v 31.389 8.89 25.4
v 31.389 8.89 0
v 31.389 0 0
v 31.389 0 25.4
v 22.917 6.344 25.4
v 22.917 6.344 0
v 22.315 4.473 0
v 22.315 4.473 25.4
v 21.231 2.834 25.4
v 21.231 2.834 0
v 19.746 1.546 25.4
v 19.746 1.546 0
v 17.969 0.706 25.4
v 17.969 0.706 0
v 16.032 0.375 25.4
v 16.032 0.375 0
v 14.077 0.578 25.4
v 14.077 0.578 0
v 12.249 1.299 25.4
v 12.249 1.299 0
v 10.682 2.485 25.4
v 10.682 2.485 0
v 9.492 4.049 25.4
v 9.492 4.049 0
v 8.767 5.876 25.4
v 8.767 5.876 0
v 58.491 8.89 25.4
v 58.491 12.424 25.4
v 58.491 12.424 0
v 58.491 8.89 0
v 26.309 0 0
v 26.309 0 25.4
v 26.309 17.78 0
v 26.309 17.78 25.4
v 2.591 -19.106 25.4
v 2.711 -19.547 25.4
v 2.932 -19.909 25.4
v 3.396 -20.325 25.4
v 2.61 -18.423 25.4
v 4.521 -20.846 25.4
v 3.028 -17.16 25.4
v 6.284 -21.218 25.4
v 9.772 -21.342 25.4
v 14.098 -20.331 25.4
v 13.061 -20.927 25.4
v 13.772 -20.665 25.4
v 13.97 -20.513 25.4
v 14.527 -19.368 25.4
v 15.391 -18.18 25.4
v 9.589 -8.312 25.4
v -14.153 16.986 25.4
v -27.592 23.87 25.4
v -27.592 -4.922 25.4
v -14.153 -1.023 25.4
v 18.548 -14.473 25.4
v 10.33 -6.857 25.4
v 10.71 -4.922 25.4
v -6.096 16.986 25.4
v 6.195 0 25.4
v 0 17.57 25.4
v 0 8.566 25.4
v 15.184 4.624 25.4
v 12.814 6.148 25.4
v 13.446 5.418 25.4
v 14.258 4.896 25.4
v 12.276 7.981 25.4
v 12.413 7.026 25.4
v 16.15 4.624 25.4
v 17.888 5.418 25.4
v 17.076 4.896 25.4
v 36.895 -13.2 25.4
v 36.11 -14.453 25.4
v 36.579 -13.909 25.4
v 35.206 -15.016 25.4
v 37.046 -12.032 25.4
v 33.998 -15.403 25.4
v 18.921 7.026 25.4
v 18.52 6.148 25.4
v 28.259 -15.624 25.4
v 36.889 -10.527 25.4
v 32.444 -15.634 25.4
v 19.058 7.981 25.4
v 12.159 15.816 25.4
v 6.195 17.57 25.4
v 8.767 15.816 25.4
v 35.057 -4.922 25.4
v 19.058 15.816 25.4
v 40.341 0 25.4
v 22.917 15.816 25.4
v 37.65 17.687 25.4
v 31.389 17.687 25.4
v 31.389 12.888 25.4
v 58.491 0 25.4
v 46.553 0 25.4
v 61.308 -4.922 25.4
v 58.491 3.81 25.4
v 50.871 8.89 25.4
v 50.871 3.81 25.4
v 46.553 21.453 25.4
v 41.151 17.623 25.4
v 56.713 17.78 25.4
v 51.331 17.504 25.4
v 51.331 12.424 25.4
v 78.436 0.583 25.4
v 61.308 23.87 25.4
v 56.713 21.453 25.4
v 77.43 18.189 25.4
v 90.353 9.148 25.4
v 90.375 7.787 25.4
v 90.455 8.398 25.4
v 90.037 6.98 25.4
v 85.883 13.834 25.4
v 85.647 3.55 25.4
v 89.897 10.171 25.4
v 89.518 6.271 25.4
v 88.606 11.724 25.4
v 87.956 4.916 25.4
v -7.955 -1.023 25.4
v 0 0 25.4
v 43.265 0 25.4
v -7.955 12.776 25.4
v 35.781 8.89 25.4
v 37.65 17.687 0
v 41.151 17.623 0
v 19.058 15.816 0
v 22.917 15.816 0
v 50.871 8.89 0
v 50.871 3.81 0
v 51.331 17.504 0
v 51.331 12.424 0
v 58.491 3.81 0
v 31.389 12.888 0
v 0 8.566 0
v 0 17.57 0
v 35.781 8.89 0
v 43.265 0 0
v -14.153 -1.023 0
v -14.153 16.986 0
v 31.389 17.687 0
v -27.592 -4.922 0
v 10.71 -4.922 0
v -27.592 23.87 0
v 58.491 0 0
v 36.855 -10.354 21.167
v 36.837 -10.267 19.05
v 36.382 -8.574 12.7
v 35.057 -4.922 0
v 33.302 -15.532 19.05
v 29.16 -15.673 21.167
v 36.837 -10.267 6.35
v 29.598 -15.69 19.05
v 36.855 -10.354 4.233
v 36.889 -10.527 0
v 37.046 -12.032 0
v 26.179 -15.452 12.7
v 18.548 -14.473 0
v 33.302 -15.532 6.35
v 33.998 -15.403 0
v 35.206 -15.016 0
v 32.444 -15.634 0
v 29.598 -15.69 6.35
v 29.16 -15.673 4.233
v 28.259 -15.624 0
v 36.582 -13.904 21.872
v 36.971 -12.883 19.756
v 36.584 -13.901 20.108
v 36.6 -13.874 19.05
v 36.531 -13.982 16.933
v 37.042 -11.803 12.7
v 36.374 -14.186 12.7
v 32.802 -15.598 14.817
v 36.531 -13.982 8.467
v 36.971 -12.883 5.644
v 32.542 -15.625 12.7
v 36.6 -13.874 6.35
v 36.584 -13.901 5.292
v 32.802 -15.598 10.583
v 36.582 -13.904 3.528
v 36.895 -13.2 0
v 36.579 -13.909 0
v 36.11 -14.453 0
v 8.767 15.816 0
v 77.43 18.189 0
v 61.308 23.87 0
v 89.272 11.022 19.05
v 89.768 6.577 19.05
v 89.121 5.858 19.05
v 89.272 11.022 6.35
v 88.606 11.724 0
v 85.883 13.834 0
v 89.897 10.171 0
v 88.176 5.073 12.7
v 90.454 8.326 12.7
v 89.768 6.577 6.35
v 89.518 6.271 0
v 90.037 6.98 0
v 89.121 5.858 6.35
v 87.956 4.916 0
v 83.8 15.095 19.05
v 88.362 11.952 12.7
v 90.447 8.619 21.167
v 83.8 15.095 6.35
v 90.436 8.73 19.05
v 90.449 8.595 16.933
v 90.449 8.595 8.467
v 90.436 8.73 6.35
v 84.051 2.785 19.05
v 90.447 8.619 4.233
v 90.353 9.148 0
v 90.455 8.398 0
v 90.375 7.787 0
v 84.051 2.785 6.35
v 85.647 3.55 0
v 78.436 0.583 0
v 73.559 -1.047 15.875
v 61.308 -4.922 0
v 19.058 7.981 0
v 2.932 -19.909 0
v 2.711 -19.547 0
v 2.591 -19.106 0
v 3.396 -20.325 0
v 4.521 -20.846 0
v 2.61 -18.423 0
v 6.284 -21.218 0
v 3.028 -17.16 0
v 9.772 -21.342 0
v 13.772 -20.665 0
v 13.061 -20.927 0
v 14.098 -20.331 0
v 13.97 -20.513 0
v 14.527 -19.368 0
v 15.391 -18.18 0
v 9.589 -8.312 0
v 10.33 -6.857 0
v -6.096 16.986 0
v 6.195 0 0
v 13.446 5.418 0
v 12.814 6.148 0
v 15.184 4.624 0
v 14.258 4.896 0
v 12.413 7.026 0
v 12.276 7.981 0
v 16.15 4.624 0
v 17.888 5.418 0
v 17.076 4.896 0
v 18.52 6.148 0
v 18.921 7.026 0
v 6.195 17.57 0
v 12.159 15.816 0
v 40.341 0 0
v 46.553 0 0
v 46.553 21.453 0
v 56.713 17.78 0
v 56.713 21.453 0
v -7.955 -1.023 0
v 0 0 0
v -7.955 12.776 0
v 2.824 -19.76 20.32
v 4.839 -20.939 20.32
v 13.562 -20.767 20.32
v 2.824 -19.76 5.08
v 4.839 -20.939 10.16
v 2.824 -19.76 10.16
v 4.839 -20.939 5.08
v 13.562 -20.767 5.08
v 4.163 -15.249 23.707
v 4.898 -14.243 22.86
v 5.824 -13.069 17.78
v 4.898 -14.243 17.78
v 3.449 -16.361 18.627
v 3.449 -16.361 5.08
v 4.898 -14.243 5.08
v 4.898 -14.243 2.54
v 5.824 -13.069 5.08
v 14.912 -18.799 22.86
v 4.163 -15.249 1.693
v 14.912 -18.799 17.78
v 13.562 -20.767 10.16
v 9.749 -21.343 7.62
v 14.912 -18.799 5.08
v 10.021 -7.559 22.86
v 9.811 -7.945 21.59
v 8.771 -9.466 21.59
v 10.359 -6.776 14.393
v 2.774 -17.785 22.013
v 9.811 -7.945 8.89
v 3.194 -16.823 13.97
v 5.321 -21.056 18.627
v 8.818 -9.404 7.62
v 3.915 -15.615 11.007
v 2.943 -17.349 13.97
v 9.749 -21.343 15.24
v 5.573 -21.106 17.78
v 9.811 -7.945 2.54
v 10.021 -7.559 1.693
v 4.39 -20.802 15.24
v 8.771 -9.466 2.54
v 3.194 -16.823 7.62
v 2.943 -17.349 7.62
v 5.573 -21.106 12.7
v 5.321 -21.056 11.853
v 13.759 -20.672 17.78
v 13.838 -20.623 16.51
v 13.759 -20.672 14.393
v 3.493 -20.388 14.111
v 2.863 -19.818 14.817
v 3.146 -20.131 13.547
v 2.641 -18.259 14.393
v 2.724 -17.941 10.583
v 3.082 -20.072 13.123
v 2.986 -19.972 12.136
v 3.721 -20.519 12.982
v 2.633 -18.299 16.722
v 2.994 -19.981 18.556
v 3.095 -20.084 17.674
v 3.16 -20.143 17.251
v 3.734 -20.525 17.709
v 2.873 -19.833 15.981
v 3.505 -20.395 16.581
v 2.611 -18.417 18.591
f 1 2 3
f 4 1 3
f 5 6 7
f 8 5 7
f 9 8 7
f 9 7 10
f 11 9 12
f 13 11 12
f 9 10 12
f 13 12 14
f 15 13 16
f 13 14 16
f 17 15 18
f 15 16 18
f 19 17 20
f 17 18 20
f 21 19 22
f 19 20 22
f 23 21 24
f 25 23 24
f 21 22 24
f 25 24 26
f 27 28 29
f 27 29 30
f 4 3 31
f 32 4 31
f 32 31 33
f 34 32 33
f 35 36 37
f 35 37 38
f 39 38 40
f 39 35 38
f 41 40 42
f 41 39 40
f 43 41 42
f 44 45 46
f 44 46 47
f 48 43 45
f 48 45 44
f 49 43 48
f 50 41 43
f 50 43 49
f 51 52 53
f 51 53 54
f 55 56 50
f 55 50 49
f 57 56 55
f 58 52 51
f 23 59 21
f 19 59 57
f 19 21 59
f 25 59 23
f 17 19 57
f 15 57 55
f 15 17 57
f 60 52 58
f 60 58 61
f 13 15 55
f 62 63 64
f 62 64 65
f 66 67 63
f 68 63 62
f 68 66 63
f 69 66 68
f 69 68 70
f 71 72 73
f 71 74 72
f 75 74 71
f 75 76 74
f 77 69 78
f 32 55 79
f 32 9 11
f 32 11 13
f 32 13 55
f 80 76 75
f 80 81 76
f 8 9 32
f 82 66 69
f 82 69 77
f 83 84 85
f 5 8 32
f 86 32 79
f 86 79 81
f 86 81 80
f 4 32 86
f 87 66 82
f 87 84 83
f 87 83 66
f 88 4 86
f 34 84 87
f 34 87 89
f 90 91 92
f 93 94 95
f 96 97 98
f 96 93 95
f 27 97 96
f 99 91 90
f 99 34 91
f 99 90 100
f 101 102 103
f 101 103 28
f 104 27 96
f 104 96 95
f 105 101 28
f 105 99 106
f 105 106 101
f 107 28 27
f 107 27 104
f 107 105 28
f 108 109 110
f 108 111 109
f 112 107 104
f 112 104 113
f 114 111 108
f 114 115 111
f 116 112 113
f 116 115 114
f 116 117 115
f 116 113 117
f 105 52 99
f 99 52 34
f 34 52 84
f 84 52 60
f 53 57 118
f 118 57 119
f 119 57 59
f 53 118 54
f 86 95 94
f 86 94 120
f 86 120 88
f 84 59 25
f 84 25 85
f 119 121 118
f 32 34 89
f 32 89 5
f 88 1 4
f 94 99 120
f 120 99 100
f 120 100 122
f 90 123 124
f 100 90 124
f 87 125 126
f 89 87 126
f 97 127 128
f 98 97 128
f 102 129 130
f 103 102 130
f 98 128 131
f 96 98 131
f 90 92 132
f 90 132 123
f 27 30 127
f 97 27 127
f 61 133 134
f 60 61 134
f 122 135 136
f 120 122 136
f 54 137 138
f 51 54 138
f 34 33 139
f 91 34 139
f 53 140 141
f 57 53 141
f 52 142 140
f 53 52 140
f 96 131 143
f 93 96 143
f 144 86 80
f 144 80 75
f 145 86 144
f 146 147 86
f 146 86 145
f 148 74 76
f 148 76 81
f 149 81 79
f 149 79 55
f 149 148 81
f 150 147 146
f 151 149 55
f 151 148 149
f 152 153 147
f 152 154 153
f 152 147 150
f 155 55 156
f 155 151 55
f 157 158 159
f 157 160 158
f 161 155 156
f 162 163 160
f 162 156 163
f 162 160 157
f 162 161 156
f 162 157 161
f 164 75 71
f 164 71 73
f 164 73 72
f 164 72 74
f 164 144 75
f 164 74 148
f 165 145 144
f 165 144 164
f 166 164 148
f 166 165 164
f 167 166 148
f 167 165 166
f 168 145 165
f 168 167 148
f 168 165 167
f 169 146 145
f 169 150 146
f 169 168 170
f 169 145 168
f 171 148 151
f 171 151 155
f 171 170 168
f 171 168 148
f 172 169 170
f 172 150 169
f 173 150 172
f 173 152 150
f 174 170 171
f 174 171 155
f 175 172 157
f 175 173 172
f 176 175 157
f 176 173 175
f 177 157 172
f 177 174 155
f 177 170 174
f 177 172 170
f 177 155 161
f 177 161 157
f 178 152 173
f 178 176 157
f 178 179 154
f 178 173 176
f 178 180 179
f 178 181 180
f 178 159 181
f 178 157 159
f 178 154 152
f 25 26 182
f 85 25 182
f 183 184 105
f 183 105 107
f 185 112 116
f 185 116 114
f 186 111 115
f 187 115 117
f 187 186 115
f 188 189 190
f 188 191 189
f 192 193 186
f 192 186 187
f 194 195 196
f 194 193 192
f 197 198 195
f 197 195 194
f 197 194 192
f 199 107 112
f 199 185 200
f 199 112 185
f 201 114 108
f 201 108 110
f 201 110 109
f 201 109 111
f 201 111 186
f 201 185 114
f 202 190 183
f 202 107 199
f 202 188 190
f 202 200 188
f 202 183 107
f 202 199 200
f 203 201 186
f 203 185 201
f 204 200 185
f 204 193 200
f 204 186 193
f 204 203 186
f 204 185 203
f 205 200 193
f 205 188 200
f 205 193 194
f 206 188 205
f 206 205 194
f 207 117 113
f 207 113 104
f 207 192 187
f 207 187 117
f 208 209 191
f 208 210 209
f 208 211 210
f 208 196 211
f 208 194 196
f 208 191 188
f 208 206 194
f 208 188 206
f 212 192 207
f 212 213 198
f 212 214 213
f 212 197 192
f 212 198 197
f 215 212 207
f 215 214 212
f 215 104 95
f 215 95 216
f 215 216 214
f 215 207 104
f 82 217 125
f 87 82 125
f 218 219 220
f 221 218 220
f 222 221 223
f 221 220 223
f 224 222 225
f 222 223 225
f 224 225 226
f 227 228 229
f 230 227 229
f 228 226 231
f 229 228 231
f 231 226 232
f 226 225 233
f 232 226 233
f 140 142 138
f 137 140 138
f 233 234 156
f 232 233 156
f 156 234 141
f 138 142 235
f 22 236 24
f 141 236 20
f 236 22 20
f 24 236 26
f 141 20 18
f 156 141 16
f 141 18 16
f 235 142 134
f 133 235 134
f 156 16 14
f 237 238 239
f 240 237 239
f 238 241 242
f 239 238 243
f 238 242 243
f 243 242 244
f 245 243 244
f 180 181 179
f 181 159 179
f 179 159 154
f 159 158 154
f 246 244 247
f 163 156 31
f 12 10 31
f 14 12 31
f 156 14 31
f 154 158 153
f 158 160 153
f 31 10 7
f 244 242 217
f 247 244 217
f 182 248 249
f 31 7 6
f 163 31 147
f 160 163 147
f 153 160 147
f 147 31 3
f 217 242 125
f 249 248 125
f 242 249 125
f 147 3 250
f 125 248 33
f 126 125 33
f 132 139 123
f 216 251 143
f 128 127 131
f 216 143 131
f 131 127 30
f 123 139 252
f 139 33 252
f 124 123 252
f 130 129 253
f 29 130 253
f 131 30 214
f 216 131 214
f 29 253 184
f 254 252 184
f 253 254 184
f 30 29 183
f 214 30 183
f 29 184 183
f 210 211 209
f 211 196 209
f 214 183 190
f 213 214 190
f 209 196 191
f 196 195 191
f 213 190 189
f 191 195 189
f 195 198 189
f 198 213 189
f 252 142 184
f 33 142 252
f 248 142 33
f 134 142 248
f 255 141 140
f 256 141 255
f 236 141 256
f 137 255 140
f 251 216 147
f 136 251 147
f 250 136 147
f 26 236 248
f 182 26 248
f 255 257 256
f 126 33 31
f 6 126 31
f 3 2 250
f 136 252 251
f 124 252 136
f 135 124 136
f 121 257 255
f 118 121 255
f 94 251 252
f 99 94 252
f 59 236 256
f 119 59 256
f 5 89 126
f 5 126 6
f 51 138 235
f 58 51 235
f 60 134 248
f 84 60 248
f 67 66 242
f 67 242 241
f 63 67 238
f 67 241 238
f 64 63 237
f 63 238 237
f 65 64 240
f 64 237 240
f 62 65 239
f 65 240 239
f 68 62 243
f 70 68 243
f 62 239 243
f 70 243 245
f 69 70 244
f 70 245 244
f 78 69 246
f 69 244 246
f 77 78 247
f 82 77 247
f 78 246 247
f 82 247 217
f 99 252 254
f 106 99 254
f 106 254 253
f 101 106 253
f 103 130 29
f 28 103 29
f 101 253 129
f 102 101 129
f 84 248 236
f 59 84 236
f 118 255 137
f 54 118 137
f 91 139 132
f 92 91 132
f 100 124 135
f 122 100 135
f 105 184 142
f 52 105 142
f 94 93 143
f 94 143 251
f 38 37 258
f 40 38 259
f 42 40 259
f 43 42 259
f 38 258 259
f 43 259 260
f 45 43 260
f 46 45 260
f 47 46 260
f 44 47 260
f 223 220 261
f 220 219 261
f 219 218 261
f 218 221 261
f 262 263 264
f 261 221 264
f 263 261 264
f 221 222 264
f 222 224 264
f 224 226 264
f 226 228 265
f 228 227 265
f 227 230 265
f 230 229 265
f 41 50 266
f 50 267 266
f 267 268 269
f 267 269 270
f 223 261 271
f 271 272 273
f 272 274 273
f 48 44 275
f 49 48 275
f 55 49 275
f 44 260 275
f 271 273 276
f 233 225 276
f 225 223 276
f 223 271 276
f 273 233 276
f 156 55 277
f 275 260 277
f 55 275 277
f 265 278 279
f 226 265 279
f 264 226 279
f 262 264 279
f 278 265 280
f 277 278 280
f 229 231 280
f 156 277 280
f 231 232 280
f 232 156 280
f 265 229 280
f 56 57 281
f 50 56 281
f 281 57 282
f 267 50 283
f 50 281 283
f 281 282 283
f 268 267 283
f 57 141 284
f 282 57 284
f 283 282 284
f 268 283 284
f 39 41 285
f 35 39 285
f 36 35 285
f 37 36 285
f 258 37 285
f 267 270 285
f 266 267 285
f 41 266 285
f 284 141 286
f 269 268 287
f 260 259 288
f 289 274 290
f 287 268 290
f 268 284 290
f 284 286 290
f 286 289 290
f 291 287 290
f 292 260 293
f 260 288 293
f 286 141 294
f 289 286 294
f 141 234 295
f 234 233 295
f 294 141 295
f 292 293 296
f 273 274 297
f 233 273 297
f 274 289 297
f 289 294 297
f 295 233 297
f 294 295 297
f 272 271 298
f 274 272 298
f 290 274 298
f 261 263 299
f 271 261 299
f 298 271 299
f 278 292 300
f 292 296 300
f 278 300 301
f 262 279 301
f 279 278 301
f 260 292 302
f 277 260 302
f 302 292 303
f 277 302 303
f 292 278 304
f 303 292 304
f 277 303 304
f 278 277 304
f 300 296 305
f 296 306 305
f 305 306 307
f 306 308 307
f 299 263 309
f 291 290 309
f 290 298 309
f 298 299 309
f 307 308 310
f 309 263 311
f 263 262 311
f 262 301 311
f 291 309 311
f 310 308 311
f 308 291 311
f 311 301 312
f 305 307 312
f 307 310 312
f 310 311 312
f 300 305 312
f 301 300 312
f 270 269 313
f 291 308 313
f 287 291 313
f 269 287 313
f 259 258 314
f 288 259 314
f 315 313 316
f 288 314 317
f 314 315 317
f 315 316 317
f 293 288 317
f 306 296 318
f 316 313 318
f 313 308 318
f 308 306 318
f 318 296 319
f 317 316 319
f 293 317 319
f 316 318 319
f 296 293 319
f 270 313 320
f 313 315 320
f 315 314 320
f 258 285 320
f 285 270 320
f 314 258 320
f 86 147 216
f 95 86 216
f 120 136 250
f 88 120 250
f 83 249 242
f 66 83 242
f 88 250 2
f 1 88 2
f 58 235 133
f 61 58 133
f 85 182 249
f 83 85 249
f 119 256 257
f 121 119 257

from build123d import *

# Parameters (mm, degrees)
F1_DEPTH = 25.4


with BuildPart() as f1:
    # F0 (on Top) → F1 (new body)
    with BuildSketch(Plane.XY):
        Polygon((61.3081902266, 23.8699343331), (-27.5918097734, 23.8699343331), (-27.5918097734, -4.9215289764), (10.7099656016, -4.9215289764), (22.7065868676, -4.9215289764), (27.98005566, -4.9215289764), (35.0572243333, -4.9215289764), (61.3081902266, -4.9215289764), align=None)
        Polygon((-14.1530148685, -1.0232002242), (-14.1530148685, 16.9856958091), (-6.096236205, 16.9856958091), (0, 8.5659530014), (0, 17.5704024732), (6.1946995556, 17.5704024732), (6.1946995556, 0), (0, 0), (-7.9551488161, 12.7758244053), (-7.9551488161, -1.0232002242), align=None, mode=Mode.SUBTRACT)
        with BuildLine():
            Line((8.7673990056, 5.8763120323), (8.7673990056, 15.8162862062))
            Line((8.7673990056, 15.8162862062), (12.1586844325, 15.8162862062))
            Line((12.1586844325, 15.8162862062), (12.2756250203, 7.9812481999))
            ThreePointArc((12.2756250203, 7.9812481999), (15.6669113785, 4.5899618417), (19.0581977367, 7.9812481999))
            Line((19.0581977367, 7.9812481999), (19.0581977367, 15.8162862062))
            Line((19.0581977367, 15.8162862062), (22.917246446, 15.8162862062))
            Line((22.917246446, 15.8162862062), (22.917246446, 6.3440757804))
            ThreePointArc((22.917246446, 6.3440757804), (16.0319130947, 0.3750876542), (8.7673990056, 5.8763120323))
        make_face(mode=Mode.SUBTRACT)
        Polygon((26.3085328043, 0), (26.3085328043, 17.78), (31.3885328043, 17.687343061), (31.3885328043, 12.8883253783), (37.6501604915, 17.687343061), (41.1511511842, 17.6234865489), (35.7807427645, 8.89), (43.2649627328, 0), (40.3414405882, 0), (31.3885328043, 8.89), (31.3885328043, 0), align=None, mode=Mode.SUBTRACT)
        Polygon((46.5532865412, 0), (46.5532865412, 17.78), (46.5532865412, 21.4527621865), (56.7132865412, 21.4527621865), (56.7132865412, 17.78), (51.3310395181, 17.5038692224), (51.3310395181, 12.4238692224), (58.4912865412, 12.4238692224), (58.4912865412, 8.89), (50.8712865412, 8.89), (50.8712865412, 3.81), (58.4912865412, 3.81), (58.4912865412, 0), align=None, mode=Mode.SUBTRACT)
        with BuildLine():
            Line((22.7065868676, -4.9215289764), (10.7099656016, -4.9215289764))
            add(Edge.make_bspline(
                [(10.7099656016, -4.9215289764), (10.6193824093, -5.9540183854), (10.3691572488, -8.8061460444), (-4.0064786059, -22.4262125693), (14.5478922895, -21.3302918169), (13.8788002341, -19.6678081158), (16.7935759894, -16.5638196867), (18.5483734178, -14.4732059457)],
                knots=[0, 0, 0, 0, 0.1275663935, 0.3523868003, 0.5591793191, 0.6348281925, 0.766787961, 0.766787961, 0.766787961, 0.766787961], degree=3))
            add(Edge.make_bspline(
                [(18.5483734178, -14.4732059457), (19.5929353174, -13.2287458017), (20.6028126804, -11.942593457), (21.2804134935, -10.7834627852)],
                knots=[0.766787961, 0.766787961, 0.766787961, 0.766787961, 0.8453384217, 0.8453384217, 0.8453384217, 0.8453384217], degree=3))
            add(Edge.make_bspline(
                [(21.2804134935, -10.7834627852), (22.6145725842, -8.5011976326), (22.6605797259, -6.7113633045), (22.7065868676, -4.9215289764)],
                knots=[0.8453384217, 0.8453384217, 0.8453384217, 0.8453384217, 1, 1, 1, 1], degree=3))
        make_face()
        with BuildLine():
            add(Edge.make_bspline(
                [(35.0572243333, -4.9215289764), (36.492752785, -8.6443748601), (39.9084026407, -17.5032133845), (26.390405815, -15.5876277523), (18.5483734178, -14.4732059457)],
                knots=[0, 0, 0, 0, 0.4201213725, 1, 1, 1, 1], degree=3))
            Line((35.0572243333, -4.9215289764), (27.98005566, -4.9215289764))
            add(Edge.make_bspline(
                [(27.98005566, -4.9215289764), (30.7410595657, -6.8420870025), (39.2308106357, -11.5408062277), (26.8989952366, -10.9269528966), (21.2804134935, -10.7834627852)],
                knots=[0, 0, 0, 0, 0.4400287118, 1, 1, 1, 1], degree=3))
            add(Edge.make_bspline(
                [(18.5483734178, -14.4732059457), (19.5929353174, -13.2287458017), (20.6028126804, -11.942593457), (21.2804134935, -10.7834627852)],
                knots=[0.766787961, 0.766787961, 0.766787961, 0.766787961, 0.8453384217, 0.8453384217, 0.8453384217, 0.8453384217], degree=3))
        make_face()
        with BuildLine():
            Line((27.98005566, -4.9215289764), (22.7065868676, -4.9215289764))
            add(Edge.make_bspline(
                [(21.2804134935, -10.7834627852), (22.6145725842, -8.5011976326), (22.6605797259, -6.7113633045), (22.7065868676, -4.9215289764)],
                knots=[0.8453384217, 0.8453384217, 0.8453384217, 0.8453384217, 1, 1, 1, 1], degree=3))
            add(Edge.make_bspline(
                [(27.98005566, -4.9215289764), (30.7410595657, -6.8420870025), (39.2308106357, -11.5408062277), (26.8989952366, -10.9269528966), (21.2804134935, -10.7834627852)],
                knots=[0, 0, 0, 0, 0.4400287118, 1, 1, 1, 1], degree=3))
        make_face()
        with BuildLine():
            add(Edge.make_bspline(
                [(61.3081902266, 23.8699343331), (75.0712619521, 19.8415075043), (105.9627124303, 7.1334485632), (74.8250609301, -0.4875464163), (61.3081902266, -4.9215289764)],
                knots=[0, 0, 0, 0, 0.5039074214, 1, 1, 1, 1], degree=3))
            Line((61.3081902266, 23.8699343331), (61.3081902266, -4.9215289764))
        make_face()
    extrude(amount=F1_DEPTH)


solid = f1.part
